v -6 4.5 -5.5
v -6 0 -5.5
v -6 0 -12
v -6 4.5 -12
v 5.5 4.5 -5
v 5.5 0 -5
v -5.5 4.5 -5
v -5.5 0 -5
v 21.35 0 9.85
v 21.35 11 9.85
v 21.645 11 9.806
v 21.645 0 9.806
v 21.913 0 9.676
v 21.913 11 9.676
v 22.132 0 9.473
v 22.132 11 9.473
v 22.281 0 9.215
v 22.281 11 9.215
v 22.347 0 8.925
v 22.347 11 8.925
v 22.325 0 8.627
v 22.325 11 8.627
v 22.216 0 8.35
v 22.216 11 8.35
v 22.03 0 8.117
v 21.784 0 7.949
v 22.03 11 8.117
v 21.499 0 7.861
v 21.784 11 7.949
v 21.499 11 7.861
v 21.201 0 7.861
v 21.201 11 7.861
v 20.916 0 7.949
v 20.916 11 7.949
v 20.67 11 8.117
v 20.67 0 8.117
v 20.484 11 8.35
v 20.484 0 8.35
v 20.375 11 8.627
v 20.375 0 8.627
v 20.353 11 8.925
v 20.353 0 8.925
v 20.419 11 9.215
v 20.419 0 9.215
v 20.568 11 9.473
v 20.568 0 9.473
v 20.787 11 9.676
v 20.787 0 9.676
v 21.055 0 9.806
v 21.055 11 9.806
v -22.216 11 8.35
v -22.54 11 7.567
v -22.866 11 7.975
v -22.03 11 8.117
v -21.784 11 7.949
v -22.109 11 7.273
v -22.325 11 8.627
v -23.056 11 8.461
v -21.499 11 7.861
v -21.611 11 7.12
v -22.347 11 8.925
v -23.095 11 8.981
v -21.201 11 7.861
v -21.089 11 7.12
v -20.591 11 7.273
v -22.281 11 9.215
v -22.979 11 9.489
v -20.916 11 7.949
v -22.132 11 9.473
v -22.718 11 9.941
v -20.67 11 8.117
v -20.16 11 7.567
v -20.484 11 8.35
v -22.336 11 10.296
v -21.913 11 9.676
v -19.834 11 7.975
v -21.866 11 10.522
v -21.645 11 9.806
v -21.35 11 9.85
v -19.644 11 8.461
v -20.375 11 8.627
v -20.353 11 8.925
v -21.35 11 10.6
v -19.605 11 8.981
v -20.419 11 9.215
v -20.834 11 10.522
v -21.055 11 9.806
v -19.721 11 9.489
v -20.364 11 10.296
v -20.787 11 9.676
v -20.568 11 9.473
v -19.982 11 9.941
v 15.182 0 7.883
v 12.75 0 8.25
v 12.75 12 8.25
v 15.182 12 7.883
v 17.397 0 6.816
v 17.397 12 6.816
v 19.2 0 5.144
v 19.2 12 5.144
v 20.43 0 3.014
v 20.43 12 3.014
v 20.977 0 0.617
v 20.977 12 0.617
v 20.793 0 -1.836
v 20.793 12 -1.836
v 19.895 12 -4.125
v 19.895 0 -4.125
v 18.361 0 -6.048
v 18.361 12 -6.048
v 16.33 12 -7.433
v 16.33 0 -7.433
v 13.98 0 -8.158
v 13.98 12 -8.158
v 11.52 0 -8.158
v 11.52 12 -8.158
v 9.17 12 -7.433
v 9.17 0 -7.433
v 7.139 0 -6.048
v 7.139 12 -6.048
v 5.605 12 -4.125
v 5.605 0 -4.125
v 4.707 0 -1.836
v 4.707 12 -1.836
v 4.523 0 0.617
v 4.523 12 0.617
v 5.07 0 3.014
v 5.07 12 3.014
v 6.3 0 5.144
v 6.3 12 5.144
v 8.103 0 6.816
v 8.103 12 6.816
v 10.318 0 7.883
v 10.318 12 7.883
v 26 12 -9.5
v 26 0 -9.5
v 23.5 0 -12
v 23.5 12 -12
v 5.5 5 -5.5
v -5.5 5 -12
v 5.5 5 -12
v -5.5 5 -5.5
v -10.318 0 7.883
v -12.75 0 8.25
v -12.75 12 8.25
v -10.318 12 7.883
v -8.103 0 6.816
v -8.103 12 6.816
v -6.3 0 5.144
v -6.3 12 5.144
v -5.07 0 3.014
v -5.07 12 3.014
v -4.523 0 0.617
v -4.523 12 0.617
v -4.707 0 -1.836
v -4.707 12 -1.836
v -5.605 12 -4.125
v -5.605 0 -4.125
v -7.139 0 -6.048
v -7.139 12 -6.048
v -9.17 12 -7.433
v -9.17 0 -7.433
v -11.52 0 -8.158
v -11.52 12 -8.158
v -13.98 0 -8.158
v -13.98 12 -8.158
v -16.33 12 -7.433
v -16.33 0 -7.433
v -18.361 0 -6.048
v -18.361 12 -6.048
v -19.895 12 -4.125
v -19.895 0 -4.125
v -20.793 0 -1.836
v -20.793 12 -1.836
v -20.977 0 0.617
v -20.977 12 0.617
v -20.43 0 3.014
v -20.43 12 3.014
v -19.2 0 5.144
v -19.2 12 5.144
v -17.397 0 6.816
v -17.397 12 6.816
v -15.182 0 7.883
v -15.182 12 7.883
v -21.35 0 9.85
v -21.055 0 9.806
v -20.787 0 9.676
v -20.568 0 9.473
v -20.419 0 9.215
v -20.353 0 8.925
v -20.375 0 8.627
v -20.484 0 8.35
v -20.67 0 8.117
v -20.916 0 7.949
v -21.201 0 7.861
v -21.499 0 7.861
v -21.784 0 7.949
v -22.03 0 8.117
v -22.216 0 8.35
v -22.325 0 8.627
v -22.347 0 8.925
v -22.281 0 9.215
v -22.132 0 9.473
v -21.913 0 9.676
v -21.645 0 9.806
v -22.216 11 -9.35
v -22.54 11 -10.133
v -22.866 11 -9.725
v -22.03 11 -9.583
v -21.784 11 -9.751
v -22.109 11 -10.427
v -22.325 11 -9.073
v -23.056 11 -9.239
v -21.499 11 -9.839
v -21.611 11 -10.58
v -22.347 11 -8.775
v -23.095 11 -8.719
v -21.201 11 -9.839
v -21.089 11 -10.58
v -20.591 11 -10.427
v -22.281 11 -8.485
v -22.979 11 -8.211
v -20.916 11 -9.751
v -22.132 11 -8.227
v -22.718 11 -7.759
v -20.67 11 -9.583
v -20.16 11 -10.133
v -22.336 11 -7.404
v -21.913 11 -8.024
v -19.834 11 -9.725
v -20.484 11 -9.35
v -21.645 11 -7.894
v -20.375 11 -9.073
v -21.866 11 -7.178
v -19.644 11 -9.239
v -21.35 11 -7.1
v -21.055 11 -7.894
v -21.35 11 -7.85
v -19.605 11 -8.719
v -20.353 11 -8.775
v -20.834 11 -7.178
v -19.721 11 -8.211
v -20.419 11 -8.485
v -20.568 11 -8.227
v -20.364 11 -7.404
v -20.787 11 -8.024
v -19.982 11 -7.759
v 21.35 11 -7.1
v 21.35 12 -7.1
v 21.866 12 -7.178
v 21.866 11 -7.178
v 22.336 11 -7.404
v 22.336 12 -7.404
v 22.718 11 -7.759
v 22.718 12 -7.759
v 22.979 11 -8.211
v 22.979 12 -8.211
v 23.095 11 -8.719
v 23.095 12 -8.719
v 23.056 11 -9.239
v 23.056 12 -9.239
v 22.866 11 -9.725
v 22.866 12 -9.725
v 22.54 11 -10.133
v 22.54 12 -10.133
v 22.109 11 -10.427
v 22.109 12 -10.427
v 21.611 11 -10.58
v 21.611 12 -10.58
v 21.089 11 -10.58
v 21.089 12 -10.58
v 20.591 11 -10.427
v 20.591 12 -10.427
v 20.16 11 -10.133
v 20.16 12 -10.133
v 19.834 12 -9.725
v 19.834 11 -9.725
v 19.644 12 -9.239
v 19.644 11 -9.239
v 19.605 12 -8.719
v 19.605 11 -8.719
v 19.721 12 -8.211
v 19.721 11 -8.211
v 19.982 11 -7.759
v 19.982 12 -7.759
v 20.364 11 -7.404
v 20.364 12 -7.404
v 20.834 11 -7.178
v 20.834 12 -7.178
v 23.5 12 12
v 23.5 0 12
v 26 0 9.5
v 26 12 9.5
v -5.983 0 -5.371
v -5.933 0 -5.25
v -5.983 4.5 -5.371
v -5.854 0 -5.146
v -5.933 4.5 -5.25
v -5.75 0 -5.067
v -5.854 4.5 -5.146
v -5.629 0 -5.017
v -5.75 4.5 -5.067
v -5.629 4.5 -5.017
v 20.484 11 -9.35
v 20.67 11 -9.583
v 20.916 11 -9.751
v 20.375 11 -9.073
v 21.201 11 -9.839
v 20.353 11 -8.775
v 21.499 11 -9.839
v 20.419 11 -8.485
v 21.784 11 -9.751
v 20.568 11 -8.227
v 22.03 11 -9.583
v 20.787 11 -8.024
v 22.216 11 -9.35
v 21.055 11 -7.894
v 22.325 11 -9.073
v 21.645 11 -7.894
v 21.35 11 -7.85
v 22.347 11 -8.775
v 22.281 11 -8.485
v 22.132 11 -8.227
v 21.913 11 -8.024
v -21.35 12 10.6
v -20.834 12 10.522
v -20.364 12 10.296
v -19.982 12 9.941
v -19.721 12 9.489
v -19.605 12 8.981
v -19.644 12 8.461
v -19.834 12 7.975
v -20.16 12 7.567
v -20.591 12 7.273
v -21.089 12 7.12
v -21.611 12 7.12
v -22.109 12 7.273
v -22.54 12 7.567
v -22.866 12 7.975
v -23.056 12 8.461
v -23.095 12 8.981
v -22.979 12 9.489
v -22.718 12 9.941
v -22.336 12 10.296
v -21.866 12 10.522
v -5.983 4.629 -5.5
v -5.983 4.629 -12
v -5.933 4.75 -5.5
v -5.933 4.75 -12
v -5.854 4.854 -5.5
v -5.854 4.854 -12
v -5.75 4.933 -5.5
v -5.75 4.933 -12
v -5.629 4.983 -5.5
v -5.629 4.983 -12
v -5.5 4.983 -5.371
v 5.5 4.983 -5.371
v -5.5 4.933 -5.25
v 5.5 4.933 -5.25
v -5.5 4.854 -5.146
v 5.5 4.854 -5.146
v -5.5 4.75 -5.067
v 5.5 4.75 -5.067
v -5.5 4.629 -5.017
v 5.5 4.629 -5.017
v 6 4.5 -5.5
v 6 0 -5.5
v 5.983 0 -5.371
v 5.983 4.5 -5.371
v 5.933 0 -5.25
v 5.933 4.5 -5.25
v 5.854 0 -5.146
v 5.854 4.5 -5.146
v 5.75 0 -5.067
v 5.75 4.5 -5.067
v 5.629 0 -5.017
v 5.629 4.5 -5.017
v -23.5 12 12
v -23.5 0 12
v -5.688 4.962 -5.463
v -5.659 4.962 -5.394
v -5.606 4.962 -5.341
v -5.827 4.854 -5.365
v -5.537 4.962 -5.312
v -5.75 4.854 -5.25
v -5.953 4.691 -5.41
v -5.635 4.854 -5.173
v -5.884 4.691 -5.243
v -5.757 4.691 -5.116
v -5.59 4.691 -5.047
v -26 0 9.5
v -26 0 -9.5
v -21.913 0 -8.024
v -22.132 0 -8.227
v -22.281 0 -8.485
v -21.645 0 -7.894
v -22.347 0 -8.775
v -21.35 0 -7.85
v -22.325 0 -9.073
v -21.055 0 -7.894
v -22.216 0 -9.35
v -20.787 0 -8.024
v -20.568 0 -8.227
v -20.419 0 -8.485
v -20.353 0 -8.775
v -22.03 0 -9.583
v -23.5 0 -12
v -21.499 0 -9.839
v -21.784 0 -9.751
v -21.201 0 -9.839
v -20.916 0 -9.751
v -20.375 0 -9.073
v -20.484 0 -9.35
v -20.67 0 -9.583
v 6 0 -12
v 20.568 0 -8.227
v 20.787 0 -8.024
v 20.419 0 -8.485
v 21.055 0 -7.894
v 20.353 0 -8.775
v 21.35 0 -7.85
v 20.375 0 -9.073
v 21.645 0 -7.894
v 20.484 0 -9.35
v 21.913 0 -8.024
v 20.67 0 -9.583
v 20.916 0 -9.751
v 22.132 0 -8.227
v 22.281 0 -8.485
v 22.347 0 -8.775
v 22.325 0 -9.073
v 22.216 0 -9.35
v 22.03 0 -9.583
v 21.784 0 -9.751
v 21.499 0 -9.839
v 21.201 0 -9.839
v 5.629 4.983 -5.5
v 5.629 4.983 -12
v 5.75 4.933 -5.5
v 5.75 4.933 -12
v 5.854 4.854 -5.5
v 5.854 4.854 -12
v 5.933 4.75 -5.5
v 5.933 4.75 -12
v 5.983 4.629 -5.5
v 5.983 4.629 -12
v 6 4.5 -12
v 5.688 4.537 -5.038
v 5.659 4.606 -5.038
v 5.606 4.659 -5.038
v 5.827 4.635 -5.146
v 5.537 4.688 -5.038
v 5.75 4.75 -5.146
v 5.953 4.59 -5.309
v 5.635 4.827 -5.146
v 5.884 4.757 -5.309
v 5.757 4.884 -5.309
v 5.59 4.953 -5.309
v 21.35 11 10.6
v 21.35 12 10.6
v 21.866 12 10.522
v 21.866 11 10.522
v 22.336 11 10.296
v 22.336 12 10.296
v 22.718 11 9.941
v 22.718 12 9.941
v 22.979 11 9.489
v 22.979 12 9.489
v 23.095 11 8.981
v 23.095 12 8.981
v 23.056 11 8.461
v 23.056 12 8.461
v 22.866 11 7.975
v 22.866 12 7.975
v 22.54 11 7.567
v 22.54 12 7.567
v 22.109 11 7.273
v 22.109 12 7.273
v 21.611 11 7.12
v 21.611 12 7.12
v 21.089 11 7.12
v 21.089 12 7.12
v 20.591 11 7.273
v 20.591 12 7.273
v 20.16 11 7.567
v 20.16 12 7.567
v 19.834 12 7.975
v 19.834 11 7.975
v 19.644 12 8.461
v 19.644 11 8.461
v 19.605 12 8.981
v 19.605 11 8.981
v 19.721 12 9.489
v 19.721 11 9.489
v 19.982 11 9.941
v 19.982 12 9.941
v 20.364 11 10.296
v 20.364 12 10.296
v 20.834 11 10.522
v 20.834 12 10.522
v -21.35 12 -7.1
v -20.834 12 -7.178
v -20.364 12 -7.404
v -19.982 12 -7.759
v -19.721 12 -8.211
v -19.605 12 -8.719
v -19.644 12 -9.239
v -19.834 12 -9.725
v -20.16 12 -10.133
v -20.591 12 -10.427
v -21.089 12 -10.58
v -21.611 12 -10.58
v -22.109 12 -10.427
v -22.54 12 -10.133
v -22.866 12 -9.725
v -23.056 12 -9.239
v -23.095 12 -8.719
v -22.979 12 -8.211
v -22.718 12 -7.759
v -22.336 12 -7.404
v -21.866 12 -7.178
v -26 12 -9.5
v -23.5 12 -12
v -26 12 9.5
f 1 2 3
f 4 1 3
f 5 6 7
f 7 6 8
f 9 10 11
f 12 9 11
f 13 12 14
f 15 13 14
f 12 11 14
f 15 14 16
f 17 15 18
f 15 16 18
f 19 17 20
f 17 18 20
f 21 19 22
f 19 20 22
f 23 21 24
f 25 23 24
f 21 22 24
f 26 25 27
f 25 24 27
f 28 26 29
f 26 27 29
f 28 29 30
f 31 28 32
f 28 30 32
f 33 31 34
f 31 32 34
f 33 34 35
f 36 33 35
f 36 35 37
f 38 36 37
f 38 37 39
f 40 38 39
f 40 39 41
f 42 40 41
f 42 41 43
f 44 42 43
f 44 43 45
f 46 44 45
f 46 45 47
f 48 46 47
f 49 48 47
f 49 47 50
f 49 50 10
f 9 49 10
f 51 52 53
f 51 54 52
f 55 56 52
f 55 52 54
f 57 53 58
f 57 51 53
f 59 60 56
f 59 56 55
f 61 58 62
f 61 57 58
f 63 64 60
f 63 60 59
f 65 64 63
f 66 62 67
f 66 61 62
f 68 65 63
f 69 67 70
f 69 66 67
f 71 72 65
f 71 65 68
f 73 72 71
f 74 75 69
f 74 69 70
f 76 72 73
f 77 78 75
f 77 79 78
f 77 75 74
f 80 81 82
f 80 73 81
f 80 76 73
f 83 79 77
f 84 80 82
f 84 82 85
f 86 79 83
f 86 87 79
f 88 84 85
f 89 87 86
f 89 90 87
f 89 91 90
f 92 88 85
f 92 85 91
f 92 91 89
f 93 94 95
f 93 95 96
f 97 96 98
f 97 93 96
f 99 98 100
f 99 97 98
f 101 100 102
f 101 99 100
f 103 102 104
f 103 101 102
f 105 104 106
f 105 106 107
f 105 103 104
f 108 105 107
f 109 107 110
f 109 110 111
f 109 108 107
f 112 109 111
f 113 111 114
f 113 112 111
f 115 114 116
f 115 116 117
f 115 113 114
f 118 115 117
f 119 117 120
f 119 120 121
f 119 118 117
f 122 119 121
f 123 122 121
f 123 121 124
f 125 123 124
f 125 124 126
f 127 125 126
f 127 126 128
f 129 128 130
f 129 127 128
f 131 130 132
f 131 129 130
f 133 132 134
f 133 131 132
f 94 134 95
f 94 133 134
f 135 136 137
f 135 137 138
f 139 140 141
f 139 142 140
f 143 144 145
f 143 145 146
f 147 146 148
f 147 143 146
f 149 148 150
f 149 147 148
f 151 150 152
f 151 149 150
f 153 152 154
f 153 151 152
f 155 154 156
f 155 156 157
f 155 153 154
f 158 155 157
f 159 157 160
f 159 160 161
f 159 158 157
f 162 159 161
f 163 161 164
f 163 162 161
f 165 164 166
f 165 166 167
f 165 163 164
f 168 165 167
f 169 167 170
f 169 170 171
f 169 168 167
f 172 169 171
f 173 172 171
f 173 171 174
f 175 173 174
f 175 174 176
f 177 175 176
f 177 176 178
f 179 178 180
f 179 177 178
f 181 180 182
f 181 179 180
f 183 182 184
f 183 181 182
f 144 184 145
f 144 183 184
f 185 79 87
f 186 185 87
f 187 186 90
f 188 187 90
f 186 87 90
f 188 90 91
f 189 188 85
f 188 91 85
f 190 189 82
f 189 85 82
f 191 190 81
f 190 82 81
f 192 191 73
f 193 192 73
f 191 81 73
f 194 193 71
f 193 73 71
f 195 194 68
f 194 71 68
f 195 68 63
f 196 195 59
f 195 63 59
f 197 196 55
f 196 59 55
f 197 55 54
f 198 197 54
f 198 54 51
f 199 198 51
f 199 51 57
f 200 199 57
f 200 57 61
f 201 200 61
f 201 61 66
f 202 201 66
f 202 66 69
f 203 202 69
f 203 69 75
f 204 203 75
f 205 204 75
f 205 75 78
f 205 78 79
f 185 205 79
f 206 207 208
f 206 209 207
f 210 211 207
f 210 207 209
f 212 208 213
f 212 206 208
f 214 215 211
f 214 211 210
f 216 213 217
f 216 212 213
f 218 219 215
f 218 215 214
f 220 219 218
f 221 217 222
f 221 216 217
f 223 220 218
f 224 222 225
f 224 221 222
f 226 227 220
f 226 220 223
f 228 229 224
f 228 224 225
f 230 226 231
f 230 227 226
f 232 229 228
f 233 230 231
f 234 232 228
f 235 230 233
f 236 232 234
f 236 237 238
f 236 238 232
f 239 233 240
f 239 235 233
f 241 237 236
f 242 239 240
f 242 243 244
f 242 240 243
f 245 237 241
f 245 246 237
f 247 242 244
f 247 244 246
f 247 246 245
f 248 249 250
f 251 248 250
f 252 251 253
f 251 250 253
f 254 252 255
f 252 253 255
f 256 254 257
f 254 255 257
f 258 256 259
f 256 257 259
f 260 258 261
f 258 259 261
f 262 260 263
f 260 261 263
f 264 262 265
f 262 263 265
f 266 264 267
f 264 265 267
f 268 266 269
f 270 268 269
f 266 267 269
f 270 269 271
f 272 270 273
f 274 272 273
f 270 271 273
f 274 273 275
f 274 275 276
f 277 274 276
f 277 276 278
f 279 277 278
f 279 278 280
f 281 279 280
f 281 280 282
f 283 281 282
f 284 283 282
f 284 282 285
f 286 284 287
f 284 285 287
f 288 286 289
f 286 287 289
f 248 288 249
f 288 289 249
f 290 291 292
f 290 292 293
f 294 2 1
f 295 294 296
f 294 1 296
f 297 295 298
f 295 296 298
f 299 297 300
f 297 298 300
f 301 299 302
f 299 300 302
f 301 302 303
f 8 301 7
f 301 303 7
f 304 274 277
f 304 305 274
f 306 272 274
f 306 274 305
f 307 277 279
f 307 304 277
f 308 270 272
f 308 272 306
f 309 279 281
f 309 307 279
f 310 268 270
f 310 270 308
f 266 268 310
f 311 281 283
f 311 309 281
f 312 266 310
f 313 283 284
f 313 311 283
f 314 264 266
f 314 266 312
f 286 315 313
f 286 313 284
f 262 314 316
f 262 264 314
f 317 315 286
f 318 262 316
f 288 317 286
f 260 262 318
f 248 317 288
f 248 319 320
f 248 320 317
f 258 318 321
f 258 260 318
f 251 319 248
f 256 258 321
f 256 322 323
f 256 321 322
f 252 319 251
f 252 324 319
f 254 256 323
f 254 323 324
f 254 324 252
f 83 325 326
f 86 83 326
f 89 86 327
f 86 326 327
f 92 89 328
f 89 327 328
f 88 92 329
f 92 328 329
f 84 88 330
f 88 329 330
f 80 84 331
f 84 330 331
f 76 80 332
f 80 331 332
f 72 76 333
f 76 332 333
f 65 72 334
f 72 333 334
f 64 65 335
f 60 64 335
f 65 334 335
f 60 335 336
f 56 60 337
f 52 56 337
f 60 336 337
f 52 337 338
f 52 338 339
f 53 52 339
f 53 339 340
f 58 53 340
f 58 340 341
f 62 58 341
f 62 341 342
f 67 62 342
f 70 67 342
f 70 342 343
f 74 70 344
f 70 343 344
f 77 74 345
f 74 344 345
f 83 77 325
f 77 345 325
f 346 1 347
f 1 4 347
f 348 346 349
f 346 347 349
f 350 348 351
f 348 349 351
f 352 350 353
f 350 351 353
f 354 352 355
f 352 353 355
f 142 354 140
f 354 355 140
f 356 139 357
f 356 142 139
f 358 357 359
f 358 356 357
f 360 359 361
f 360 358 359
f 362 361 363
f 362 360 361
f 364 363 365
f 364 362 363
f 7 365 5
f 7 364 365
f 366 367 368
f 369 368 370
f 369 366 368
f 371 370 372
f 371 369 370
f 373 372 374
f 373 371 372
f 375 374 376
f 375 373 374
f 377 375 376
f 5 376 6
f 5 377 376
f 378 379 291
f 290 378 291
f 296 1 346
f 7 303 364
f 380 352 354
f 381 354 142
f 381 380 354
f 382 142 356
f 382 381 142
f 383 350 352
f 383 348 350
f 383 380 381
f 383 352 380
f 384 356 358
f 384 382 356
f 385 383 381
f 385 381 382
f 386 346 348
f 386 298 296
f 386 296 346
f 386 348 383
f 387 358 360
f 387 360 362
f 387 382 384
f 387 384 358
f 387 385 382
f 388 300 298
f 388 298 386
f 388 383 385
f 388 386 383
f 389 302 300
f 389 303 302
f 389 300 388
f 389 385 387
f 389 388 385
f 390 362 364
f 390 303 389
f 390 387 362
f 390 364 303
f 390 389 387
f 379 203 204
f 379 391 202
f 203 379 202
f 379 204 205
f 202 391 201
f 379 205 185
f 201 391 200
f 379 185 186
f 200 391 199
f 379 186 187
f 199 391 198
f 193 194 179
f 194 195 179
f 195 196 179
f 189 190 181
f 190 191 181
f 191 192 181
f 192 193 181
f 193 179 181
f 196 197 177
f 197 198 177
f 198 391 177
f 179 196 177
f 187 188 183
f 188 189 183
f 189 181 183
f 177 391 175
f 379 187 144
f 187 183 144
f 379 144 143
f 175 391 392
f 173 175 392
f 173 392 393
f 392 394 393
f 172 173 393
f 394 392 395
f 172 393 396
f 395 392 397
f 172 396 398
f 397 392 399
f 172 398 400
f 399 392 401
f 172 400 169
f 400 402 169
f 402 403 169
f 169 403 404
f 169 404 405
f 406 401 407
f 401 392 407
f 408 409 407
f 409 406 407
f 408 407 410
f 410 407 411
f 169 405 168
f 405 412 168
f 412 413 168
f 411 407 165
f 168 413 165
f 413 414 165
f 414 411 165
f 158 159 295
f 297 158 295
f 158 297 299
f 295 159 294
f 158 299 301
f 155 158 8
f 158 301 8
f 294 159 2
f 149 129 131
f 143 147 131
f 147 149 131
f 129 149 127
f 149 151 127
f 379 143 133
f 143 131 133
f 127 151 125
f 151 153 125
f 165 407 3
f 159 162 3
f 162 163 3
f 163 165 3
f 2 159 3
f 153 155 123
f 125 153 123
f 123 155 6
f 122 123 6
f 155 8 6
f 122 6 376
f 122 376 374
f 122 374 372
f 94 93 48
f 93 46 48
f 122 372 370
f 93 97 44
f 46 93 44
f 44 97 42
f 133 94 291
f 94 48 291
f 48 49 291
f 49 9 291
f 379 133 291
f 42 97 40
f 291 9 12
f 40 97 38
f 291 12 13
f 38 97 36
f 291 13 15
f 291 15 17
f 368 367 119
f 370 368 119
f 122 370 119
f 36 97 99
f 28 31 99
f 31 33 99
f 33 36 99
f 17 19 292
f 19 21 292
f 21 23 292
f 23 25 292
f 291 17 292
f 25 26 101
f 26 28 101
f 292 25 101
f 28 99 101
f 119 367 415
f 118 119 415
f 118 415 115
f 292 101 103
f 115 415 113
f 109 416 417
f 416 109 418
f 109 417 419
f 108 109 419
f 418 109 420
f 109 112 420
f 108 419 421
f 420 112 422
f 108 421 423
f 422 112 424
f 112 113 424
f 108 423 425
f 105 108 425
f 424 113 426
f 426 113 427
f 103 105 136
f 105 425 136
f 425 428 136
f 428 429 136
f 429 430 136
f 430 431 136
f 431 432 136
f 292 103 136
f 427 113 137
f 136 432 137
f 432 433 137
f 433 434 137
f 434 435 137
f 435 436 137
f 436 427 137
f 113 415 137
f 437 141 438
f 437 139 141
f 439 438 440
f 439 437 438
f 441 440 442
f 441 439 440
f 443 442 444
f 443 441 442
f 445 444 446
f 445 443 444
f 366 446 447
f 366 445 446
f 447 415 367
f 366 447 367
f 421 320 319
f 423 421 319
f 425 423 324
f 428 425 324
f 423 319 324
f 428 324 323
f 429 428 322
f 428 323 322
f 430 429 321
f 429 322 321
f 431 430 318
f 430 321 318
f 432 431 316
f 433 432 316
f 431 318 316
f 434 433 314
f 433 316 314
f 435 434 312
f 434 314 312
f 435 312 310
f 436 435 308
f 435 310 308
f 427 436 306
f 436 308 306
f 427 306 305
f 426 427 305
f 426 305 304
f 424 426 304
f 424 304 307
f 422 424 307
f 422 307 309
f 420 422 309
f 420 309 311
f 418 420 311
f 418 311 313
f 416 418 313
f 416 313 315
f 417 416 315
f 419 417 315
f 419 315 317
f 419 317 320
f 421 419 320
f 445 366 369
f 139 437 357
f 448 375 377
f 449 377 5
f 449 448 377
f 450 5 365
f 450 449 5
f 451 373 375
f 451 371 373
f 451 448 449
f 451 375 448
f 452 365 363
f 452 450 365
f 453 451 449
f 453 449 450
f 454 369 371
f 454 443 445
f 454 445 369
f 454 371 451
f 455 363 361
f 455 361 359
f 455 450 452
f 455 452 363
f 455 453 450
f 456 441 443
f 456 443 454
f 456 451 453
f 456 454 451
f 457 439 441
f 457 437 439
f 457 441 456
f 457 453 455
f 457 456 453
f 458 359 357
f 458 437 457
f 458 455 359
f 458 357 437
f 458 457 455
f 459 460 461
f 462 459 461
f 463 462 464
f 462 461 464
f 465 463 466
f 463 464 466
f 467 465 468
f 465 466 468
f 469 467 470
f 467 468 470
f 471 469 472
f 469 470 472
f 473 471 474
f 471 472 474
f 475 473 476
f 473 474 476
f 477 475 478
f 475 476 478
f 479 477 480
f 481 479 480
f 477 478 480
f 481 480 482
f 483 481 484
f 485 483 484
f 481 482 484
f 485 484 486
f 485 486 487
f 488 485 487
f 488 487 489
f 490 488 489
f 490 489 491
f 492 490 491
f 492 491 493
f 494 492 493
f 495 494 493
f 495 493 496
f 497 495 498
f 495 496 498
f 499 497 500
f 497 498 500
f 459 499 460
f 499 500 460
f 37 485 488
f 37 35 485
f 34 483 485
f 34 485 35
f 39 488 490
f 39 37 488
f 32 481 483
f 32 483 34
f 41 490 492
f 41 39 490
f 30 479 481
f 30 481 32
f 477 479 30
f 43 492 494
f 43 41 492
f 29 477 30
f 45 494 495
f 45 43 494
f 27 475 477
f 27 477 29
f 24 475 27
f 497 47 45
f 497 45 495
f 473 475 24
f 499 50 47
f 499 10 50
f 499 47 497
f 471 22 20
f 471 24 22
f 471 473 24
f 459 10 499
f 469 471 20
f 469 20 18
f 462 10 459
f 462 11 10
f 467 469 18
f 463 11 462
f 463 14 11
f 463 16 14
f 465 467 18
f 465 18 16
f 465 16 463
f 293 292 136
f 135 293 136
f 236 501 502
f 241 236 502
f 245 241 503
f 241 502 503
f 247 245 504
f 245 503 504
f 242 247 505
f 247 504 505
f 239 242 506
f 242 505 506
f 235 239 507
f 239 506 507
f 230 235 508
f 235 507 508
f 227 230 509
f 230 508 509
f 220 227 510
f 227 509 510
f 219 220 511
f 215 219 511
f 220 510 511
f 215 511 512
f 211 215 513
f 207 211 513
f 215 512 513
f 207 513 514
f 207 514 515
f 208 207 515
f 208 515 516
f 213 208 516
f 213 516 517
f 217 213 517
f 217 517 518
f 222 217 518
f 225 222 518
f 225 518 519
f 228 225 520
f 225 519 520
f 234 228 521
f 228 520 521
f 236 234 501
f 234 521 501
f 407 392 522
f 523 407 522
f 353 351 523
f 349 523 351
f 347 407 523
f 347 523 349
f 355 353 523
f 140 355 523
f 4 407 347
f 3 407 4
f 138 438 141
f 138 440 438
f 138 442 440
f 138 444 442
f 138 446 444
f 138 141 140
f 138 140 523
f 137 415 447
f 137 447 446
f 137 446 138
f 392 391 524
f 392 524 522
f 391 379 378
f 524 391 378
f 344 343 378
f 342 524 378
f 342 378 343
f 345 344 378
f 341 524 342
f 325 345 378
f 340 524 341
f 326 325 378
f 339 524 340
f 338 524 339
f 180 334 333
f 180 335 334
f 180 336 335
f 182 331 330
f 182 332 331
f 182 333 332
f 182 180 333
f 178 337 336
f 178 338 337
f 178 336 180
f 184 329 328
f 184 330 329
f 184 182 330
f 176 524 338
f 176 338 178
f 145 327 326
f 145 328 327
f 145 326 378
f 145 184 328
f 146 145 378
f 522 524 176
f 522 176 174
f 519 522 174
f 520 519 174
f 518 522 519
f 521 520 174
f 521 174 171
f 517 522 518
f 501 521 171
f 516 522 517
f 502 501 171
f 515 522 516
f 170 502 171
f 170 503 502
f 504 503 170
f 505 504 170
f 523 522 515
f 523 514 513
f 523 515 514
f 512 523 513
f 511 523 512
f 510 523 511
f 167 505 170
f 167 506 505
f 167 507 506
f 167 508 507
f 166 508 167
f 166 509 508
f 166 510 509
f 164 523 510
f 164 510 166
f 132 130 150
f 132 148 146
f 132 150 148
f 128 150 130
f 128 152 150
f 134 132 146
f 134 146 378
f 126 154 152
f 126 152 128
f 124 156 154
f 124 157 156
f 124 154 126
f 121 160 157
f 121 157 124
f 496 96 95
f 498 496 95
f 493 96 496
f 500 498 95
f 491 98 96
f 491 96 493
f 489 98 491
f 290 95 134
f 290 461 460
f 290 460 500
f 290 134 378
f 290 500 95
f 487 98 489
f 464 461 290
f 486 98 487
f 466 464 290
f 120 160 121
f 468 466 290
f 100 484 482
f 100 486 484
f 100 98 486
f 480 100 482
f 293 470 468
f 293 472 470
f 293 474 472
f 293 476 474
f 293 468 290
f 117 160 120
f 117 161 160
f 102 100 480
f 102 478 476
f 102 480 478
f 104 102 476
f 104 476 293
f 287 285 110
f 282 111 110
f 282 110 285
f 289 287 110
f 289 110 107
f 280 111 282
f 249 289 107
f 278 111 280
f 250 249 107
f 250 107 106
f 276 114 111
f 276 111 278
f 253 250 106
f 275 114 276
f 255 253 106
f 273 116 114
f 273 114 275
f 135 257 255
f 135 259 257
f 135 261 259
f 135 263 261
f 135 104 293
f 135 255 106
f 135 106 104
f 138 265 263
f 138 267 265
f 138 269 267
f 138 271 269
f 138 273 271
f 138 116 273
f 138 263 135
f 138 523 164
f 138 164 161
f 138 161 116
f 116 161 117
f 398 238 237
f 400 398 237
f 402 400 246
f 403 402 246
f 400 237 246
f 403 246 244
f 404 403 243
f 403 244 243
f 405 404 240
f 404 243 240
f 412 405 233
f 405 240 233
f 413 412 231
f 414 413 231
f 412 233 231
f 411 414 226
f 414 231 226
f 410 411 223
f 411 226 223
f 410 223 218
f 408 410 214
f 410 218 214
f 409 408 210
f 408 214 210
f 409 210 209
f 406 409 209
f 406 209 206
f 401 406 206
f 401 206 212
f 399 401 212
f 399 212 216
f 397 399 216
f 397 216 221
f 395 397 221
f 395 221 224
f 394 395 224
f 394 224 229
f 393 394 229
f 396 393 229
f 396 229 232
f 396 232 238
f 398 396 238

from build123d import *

# Parameters (mm, degrees)
SKETCH1_W           = 52
SKETCH1_H           = 24
SKETCH1_R           = 8.25
BOSS_EXTRUDE1_DEPTH = 12
SKETCH2_R           = 1
CUT_EXTRUDE1_DEPTH  = 32.048349393
SKETCH3_R           = 1.75
CUT_EXTRUDE2_DEPTH  = 1
CUT_EXTRUDE3_DEPTH  = 5
FILLET3_R           = 0.5
CHAMFER1_SIZE       = 2.5


with BuildPart() as part:
    # Sketch1 → Boss-Extrude1 (new body)
    with BuildSketch(Plane(origin=(0, 0, 0), x_dir=(1, 0, 0), z_dir=(0, 1, 0))):
        Rectangle(SKETCH1_W, SKETCH1_H)
        with Locations(Location((12.75, 0, 0), (0, 0, 270))):
            Circle(SKETCH1_R, mode=Mode.SUBTRACT)
        with Locations(Location((-12.75, 0, 0), (0, 0, 270))):
            Circle(SKETCH1_R, mode=Mode.SUBTRACT)
    extrude(amount=BOSS_EXTRUDE1_DEPTH)

    # Sketch2 → Cut-Extrude1 (cut, through all)
    with BuildSketch(Plane(origin=(0, 12, 0), x_dir=(1, 0, 0), z_dir=(0, 1, 0))):
        with Locations(Location((-21.35, 8.85, 0), (0, 0, 270))):
            Circle(SKETCH2_R)
        with Locations(Location((21.35, 8.85, 0), (0, 0, 270))):
            Circle(SKETCH2_R)
        with Locations(Location((21.35, -8.85, 0), (0, 0, 270))):
            Circle(SKETCH2_R)
        with Locations(Location((-21.35, -8.85, 0), (0, 0, 270))):
            Circle(SKETCH2_R)
    extrude(amount=-CUT_EXTRUDE1_DEPTH, mode=Mode.SUBTRACT)

    # Sketch3 → Cut-Extrude2 (cut)
    with BuildSketch(Plane(origin=(0, 12, 0), x_dir=(1, 0, 0), z_dir=(0, 1, 0))):
        with Locations(Location((-21.35, 8.85, 0), (0, 0, 270))):
            Circle(SKETCH3_R)
        with Locations(Location((21.35, 8.85, 0), (0, 0, 270))):
            Circle(SKETCH3_R)
        with Locations(Location((21.35, -8.85, 0), (0, 0, 270))):
            Circle(SKETCH3_R)
        with Locations(Location((-21.35, -8.85, 0), (0, 0, 270))):
            Circle(SKETCH3_R)
    extrude(amount=-CUT_EXTRUDE2_DEPTH, mode=Mode.SUBTRACT)

    # Sketch4 → Cut-Extrude3 (cut)
    with BuildSketch(Plane.XZ):
        Polygon((-6, -5), (-6, -12), (6, -12), (6, -5), (0, -5), align=None)
    extrude(amount=-CUT_EXTRUDE3_DEPTH, mode=Mode.SUBTRACT)

    # Fillet3
    fillet3_edges = [part.edges().sort_by_distance(p)[0] for p in [
        (-6, 2.5, -5),
        (6, 5, -8.5),
        (6, 2.5, -5),
        (-6, 5, -8.5),
        (0, 5, -5),
    ]]
    fillet(fillet3_edges, radius=FILLET3_R)

    # Chamfer1
    chamfer1_edges = [part.edges().sort_by_distance(p)[0] for p in [
        (26, 6, 12),
        (-26, 6, 12),
        (-26, 6, -12),
        (26, 6, -12),
    ]]
    chamfer(chamfer1_edges, length=CHAMFER1_SIZE)


solid = part.part
